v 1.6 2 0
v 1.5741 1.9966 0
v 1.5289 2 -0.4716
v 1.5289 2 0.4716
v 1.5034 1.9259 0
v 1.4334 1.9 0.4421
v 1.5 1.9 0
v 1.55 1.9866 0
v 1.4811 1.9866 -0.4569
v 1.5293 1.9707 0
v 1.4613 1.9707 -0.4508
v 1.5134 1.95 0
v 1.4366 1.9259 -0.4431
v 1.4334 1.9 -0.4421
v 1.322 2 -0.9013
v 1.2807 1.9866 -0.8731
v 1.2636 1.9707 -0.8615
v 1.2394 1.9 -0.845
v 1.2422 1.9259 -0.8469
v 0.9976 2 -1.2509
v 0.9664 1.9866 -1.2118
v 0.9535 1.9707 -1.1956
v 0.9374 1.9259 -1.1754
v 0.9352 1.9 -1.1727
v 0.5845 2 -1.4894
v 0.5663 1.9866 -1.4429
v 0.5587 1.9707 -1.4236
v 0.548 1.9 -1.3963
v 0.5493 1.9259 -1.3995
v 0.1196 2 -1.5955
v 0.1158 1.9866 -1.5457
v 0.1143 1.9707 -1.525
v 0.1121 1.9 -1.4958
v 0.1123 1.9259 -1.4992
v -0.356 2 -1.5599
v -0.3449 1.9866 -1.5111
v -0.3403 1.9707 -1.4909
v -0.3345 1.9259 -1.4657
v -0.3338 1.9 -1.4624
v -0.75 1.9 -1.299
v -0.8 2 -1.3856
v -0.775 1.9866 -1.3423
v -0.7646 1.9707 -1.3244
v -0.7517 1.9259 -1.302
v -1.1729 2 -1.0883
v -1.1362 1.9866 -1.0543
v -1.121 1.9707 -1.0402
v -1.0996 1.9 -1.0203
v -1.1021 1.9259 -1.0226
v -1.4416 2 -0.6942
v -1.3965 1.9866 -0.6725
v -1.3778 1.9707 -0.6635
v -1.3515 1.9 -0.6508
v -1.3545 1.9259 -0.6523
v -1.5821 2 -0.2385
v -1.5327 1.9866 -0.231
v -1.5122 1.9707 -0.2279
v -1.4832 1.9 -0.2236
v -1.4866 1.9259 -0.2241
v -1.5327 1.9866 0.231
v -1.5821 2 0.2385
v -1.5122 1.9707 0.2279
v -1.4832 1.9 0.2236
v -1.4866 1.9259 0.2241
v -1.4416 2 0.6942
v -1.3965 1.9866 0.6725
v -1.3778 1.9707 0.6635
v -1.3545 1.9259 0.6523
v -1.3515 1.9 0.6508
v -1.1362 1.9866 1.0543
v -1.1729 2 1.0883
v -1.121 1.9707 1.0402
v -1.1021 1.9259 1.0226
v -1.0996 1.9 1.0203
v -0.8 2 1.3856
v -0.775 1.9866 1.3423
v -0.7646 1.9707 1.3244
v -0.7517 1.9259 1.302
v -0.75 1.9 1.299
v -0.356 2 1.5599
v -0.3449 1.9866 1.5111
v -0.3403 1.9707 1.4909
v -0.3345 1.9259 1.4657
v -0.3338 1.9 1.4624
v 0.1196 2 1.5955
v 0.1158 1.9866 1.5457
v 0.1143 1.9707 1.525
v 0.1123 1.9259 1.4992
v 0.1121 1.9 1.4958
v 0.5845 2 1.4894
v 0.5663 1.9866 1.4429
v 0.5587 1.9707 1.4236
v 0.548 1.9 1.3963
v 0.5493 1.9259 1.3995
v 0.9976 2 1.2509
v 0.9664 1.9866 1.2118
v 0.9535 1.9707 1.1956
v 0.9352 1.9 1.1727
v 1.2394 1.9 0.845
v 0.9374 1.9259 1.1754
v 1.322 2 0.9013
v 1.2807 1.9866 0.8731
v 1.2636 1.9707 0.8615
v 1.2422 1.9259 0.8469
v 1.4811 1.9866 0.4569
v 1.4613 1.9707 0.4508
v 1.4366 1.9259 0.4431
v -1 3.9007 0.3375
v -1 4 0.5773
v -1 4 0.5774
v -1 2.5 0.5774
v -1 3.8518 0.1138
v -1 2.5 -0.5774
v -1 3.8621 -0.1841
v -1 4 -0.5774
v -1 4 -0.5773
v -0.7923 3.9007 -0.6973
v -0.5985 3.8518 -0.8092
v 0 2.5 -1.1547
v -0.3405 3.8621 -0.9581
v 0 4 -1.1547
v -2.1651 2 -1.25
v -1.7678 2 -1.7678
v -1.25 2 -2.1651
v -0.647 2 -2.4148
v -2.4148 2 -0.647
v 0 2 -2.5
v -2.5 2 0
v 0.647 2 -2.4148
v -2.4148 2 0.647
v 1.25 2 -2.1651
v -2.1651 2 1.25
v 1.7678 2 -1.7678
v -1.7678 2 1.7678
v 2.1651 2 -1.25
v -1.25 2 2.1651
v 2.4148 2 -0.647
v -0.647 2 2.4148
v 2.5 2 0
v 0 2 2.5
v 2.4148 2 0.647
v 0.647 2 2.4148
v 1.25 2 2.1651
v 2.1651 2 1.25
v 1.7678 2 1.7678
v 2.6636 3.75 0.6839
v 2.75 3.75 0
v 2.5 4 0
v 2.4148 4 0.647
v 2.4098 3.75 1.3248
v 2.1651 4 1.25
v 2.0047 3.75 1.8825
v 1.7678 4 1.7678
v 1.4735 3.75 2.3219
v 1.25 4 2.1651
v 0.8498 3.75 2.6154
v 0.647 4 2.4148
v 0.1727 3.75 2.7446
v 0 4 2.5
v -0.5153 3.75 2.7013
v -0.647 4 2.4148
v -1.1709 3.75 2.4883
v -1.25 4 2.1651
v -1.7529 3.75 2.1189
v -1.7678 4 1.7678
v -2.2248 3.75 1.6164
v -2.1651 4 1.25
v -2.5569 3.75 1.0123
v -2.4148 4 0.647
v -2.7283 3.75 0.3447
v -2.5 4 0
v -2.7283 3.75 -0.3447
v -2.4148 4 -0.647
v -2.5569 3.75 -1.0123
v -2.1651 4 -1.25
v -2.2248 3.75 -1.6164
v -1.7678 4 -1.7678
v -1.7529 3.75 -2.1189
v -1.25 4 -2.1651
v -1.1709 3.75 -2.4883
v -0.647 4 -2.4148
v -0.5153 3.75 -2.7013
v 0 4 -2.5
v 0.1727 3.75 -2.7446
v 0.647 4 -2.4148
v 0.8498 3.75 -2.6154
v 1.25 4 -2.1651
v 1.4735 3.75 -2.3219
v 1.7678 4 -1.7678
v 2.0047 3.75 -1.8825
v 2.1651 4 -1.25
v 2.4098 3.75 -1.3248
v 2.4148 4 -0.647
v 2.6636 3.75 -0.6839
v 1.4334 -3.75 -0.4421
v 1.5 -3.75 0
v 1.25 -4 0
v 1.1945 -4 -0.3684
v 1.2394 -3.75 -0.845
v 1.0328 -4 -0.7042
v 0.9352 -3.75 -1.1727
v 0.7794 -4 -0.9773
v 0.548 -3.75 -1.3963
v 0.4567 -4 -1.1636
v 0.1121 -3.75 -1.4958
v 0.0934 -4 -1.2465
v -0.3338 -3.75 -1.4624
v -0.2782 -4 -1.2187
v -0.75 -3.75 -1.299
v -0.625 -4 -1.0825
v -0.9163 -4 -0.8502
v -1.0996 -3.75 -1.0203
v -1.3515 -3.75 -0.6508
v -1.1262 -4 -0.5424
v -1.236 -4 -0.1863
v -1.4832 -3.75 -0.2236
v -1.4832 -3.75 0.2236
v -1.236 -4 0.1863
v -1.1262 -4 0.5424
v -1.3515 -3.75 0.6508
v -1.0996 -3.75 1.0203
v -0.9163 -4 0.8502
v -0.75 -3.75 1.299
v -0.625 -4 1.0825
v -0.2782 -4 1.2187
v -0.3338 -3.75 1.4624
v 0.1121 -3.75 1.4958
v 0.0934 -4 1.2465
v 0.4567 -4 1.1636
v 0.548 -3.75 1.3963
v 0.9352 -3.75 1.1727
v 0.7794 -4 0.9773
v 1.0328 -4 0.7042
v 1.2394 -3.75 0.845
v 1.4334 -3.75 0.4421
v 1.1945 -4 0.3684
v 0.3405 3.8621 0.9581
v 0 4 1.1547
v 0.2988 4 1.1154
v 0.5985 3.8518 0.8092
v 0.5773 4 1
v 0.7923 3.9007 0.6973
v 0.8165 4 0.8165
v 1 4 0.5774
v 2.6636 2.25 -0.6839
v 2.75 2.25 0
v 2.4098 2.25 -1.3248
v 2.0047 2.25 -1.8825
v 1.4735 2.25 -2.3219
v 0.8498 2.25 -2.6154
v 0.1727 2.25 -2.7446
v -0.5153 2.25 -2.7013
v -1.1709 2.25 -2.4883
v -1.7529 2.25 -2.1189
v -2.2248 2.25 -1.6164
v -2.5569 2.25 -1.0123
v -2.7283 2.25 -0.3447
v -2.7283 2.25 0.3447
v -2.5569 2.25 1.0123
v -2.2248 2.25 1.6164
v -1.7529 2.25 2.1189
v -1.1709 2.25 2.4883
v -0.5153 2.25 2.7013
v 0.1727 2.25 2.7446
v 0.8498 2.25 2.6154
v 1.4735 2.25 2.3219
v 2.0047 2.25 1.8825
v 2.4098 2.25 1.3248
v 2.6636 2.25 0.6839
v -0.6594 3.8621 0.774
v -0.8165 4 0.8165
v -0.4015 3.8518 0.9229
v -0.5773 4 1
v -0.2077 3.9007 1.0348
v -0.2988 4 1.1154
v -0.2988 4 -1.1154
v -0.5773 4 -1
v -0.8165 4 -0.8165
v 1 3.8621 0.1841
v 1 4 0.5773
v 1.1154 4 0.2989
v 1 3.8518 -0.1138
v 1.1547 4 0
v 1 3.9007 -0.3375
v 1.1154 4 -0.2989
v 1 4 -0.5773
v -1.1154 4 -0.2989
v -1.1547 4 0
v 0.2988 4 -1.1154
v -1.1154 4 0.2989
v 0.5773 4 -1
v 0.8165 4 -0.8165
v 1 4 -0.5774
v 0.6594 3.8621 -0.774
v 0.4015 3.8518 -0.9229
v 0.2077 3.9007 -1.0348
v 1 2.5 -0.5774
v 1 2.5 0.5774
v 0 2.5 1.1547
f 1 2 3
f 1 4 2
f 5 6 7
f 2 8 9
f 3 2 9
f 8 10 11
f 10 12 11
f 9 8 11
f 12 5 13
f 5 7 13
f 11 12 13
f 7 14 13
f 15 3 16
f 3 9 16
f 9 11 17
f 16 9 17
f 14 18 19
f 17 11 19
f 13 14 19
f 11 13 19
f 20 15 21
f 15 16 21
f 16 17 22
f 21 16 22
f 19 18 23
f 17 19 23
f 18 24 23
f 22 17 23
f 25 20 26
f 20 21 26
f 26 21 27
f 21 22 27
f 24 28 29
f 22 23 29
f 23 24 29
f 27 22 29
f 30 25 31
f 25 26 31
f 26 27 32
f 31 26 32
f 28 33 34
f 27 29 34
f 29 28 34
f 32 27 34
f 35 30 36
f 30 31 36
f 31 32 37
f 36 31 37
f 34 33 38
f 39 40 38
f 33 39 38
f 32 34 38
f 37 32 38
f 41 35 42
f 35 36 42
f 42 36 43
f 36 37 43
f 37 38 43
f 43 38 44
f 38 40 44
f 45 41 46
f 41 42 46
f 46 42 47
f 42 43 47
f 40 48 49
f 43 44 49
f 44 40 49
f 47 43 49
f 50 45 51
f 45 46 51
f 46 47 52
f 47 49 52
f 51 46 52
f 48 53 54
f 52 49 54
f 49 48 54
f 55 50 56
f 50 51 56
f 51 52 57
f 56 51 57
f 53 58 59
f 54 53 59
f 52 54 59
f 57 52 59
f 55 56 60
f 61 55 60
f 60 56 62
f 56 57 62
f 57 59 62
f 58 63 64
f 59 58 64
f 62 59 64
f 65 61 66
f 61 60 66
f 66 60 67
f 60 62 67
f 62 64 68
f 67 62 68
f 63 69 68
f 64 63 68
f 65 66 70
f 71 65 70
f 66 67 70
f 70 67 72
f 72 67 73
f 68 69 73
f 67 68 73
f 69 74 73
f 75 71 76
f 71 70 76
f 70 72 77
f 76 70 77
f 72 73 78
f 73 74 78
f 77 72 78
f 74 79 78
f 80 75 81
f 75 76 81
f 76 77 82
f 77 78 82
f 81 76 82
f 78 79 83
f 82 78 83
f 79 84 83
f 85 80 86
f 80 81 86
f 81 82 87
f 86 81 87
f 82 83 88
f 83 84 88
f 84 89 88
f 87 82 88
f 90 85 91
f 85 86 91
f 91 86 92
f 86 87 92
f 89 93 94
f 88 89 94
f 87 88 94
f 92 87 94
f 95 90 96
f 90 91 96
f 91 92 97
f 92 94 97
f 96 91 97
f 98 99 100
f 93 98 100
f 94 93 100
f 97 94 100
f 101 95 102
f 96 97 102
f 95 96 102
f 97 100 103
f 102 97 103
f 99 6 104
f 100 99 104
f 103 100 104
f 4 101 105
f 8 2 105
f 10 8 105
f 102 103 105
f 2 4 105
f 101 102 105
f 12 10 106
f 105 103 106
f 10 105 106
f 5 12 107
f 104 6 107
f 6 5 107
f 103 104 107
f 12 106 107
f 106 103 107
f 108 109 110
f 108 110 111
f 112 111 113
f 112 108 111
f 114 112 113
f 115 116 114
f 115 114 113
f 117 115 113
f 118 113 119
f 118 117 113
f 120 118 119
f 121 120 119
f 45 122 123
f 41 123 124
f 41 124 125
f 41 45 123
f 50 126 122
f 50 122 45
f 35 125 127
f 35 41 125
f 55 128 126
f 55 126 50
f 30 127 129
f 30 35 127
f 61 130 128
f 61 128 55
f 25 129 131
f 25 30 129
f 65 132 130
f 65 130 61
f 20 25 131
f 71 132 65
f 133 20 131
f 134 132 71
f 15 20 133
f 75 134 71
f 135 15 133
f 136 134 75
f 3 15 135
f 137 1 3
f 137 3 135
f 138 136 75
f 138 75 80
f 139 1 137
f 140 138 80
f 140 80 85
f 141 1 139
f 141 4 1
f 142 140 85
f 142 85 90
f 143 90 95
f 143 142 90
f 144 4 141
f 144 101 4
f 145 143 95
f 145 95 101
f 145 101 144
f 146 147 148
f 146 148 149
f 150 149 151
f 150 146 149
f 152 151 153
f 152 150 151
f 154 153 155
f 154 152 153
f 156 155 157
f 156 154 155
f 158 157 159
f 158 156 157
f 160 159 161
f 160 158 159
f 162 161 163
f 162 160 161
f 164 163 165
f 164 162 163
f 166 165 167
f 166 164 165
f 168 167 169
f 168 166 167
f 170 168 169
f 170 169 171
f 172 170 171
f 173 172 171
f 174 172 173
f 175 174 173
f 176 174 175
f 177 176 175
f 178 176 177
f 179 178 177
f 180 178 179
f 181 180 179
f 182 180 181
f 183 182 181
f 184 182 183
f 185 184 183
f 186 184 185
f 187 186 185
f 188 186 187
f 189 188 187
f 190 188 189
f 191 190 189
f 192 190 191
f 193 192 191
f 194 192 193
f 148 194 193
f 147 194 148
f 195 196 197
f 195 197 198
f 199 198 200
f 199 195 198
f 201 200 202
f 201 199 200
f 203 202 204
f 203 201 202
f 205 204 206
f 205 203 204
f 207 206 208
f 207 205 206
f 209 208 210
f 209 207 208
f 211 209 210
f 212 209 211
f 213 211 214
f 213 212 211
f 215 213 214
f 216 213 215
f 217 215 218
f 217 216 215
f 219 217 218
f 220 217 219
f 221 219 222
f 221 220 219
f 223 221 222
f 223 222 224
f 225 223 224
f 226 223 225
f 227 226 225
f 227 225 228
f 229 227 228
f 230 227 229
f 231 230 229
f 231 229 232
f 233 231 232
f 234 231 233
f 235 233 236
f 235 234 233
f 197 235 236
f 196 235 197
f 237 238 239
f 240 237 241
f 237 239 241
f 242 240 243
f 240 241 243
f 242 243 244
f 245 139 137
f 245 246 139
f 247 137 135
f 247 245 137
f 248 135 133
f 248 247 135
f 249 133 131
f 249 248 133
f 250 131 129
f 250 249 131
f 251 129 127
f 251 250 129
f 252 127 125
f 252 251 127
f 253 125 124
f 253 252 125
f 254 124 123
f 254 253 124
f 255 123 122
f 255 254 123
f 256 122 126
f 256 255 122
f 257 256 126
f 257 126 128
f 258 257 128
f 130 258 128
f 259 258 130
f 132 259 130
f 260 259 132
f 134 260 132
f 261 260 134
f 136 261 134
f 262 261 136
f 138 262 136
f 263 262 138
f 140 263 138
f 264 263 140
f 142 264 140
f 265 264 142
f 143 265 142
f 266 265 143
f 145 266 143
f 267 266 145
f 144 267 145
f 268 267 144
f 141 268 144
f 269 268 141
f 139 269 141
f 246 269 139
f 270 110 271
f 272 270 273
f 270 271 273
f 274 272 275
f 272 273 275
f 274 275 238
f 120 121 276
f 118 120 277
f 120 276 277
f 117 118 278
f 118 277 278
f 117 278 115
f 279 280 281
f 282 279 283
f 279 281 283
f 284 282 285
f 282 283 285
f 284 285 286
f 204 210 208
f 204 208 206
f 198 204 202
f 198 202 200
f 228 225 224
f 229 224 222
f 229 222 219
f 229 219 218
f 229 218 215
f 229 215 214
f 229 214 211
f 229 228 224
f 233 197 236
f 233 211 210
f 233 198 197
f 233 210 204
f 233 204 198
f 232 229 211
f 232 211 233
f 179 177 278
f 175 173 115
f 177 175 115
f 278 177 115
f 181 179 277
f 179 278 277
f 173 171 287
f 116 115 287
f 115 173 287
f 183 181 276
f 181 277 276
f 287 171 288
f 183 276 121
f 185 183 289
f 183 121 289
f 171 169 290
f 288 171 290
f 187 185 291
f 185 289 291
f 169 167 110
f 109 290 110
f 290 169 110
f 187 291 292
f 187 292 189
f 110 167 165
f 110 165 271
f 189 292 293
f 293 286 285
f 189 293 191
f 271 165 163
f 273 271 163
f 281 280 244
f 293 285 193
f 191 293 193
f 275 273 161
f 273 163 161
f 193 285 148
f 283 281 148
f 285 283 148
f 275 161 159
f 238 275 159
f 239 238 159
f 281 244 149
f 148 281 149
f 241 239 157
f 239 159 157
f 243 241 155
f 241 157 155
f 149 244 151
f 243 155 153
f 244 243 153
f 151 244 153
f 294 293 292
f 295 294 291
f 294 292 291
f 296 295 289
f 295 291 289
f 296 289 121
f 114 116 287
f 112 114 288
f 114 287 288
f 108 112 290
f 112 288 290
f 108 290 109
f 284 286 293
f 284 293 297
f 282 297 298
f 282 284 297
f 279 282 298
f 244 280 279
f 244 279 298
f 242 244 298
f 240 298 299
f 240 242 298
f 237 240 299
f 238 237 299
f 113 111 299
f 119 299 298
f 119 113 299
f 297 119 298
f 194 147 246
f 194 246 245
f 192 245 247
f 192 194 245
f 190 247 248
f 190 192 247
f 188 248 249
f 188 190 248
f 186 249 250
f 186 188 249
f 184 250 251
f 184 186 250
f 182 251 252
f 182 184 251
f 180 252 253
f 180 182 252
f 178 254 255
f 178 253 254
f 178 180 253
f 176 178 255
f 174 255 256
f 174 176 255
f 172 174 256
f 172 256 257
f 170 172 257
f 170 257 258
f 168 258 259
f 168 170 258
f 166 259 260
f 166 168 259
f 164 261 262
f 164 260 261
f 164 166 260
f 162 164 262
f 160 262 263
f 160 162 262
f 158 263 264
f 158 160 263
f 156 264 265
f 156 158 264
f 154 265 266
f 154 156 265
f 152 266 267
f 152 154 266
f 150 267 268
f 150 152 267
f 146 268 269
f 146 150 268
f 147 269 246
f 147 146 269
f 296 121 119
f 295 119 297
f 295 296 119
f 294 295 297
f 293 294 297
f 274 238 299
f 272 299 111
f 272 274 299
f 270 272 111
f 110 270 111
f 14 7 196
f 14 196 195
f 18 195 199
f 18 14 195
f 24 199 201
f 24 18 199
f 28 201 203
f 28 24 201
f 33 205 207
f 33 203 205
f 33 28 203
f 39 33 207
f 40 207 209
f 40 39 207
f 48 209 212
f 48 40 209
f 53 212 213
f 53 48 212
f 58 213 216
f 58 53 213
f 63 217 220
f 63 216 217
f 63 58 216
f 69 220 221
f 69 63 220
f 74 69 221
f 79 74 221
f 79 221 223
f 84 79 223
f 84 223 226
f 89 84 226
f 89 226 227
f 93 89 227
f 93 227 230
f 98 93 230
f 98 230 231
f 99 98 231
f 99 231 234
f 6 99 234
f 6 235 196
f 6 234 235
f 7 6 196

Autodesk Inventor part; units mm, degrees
ref_plane "YZ Plane" through (0, 0, 0) normal (1, 0, 0) x (0, 1, 0)
ref_plane "XZ Plane" through (0, 0, 0) normal (0, 1, 0) x (-1, 0, 0)
ref_plane "XY Plane" through (0, 0, 0) normal (0, 0, 1) x (1, 0, 0)
sketch "Sketch1" plane through (0, 0, 0) normal (0, 0, 1) x (1, 0, 0)
  line L0 (0, 4) -> (0, -4)
  line L1 (0, -4) -> (1.25, -4)
  line L2 (1.25, -4) -> (1.5, -3.75)
  line L3 (1.5, -3.75) -> (1.5, 1.9)
  line L4 (1.6, 2) -> (2.5, 2)
  line L5 (2.75, 2.25) -> (2.75, 3.75)
  line L6 (2.5, 4) -> (0, 4)
  arc A0 (1.6, 2) -> (1.5, 1.9) centre (1.6, 1.9) ccw
  line L7 (2.5, 4) -> (2.75, 3.75)
  line L8 (2.5, 2) -> (2.75, 2.25)
  point P0 (0, 0)
  point P1 (2.75, 2)
  point P2 (2.75, 4)
  point P3 (0, 0)
  dimension "d0" = 5.5
  dimension "d1" = 2
  dimension "d3" = 3
  dimension "d4" = 3.2
  dimension "d5" = 135
  dimension "d6" = 0.25
  dimension "d7" = 6
  dimension "d9" = 0.25
revolve "Revolution1" add sketch "Sketch1" angle 360 about axis through (0, 4, 0) along (0, -1, 0)
sketch "Sketch2" plane through (0, 4, 0) normal (0, 1, 0) x (1, 0, 0)
  line L0 (0, -1.1547) -> (-1, -0.5774)
  line L1 (-1, -0.5774) -> (-1, 0.5774)
  line L2 (-1, 0.5774) -> (0, 1.1547)
  line L3 (0, 1.1547) -> (1, 0.5774)
  line L4 (1, 0.5774) -> (1, -0.5774)
  line L5 (1, -0.5774) -> (0, -1.1547)
  point P0 (0, 0)
  point P1 (0, 0)
  dimension "d11" = 2
extrude "Extrusion1" cut sketch "Sketch2" against normal blind 1.5
thread "Thread1" size "M3x0.35" class "6g" standard "ANSI Metric M Profile" full length
sketch "Sketch3" plane through (0, 0, 0) normal (1, 0, 0) x (0, 1, 0)
  line L0 (4, 1.1547) -> (3, 0.1547)
  line L1 (3, 0.1547) -> (4, 0.1547)
  line L2 (4, 0.1547) -> (4, 1.1547)
  line L3 (-0.8, 0) -> (4.8, 0) projected
  point P0 (0, 0)
  dimension "d18" = 1
revolve "Revolution2" cut sketch "Sketch3" angle 360 about axis through (0, -10, 0) along (0, 1, 0)
properties part number "Bolt_M3x0.35_6mm_SH" material "Stainless Steel"
